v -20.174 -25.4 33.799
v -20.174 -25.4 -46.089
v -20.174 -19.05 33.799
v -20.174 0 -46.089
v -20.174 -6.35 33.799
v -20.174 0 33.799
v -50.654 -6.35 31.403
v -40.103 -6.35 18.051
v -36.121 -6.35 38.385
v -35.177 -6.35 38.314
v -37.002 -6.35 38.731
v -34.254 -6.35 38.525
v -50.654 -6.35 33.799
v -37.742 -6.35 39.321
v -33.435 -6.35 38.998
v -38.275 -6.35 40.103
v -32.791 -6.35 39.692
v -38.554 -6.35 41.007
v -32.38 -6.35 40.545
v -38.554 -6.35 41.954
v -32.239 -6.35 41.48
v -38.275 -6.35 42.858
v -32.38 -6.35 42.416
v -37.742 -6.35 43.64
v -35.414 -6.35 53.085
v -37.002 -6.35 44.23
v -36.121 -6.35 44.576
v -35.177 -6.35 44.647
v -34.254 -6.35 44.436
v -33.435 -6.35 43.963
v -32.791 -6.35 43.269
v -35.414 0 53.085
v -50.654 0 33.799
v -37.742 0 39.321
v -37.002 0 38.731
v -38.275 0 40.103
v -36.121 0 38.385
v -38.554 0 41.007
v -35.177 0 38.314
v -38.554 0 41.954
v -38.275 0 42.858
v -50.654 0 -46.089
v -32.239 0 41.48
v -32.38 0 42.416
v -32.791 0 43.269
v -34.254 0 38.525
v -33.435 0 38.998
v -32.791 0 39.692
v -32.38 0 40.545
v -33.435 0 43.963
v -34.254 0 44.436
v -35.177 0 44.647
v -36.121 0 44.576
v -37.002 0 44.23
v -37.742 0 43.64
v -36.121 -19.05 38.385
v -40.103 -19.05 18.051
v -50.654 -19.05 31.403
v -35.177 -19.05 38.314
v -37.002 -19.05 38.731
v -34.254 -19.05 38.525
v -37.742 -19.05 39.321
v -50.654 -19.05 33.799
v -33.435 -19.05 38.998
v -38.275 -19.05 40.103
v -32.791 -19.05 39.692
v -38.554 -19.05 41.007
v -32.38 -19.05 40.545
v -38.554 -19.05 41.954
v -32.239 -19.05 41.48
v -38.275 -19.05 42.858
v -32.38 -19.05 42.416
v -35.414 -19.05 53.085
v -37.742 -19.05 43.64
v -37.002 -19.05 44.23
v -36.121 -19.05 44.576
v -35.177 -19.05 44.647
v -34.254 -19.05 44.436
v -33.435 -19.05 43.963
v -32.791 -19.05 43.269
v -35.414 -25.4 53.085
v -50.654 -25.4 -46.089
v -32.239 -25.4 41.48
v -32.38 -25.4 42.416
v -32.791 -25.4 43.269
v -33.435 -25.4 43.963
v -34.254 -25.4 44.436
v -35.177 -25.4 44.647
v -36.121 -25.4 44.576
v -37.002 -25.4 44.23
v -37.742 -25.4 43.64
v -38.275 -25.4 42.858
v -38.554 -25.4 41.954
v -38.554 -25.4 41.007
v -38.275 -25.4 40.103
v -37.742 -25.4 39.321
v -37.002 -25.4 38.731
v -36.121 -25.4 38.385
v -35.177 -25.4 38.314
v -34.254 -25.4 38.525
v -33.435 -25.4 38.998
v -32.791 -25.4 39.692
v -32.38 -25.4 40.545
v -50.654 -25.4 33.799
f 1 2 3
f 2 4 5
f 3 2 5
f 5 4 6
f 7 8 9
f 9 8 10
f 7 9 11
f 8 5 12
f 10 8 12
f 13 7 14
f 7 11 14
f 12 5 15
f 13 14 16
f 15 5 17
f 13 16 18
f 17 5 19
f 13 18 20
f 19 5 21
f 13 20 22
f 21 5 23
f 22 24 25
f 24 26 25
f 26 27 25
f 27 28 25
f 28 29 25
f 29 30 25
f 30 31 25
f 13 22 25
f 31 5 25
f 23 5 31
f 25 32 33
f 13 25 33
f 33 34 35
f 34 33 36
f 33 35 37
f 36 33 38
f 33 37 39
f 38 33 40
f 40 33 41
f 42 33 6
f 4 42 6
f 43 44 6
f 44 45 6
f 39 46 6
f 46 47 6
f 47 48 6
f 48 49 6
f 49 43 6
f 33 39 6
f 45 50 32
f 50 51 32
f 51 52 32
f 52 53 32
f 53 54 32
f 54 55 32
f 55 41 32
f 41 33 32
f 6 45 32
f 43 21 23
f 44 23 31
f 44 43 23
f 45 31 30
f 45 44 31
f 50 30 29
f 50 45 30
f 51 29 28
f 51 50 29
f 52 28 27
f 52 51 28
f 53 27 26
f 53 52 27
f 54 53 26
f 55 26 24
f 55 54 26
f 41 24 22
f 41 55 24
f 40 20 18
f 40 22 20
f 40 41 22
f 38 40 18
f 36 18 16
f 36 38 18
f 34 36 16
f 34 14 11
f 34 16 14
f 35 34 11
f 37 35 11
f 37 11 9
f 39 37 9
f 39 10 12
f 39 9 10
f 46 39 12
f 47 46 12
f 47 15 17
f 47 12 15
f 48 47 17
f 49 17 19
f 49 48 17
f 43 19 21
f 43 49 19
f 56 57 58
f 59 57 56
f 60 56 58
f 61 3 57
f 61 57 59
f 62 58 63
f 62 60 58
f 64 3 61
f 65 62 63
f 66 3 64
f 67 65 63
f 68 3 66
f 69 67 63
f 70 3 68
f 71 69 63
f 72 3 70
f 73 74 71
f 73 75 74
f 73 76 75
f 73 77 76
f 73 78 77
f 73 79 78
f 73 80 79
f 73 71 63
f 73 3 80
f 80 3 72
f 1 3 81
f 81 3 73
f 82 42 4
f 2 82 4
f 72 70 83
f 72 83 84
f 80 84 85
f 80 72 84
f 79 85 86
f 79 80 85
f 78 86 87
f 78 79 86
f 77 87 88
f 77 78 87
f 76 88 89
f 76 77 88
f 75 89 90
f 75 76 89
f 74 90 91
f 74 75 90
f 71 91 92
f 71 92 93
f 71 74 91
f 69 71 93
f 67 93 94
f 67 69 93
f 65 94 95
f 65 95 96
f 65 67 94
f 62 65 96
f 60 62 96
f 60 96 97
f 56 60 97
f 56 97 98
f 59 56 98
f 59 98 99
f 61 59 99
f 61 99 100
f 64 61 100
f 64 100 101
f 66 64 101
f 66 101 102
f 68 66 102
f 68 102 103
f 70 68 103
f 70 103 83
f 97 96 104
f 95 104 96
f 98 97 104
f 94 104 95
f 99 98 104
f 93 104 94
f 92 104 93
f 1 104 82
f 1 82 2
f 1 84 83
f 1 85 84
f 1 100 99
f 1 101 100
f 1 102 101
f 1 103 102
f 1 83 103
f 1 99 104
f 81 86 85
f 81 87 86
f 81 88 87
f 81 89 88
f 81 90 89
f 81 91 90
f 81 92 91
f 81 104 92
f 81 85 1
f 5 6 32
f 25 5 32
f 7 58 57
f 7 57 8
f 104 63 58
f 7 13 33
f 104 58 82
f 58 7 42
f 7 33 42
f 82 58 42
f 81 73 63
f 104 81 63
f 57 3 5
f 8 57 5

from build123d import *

# Parameters (mm, degrees)
F0_R     = 3.175
F1_DEPTH = 25.4
F2_W     = 12.7
F2_H     = 24.5806615153
F3_DEPTH = 25.4


with BuildPart() as f1:
    # F0 (on Front) → F1 (new body)
    with BuildSketch(Plane.XZ):
        Polygon((-20.1742626747, 33.7985328736), (-35.4142626747, 53.0845723978), (-50.6542626747, 33.7985328736), (-50.6542626747, -46.0891589454), (-20.1742626747, -46.0891589454), align=None)
        with Locations((-35.4142626747, 41.4804334976)):
            Circle(F0_R, mode=Mode.SUBTRACT)
    extrude(amount=F1_DEPTH)

    # F2 (on face) → F3 (cut)
    with BuildSketch(Plane(origin=(4.0221113088, 0, 3.1783081368), x_dir=(0, 1, 0), z_dir=(0.7846021358, 0, 0.6199995875))):
        with Locations((-12.7, 51.3167663736)):
            Rectangle(F2_W, F2_H)
    extrude(amount=-F3_DEPTH, mode=Mode.SUBTRACT)


solid = f1.part
